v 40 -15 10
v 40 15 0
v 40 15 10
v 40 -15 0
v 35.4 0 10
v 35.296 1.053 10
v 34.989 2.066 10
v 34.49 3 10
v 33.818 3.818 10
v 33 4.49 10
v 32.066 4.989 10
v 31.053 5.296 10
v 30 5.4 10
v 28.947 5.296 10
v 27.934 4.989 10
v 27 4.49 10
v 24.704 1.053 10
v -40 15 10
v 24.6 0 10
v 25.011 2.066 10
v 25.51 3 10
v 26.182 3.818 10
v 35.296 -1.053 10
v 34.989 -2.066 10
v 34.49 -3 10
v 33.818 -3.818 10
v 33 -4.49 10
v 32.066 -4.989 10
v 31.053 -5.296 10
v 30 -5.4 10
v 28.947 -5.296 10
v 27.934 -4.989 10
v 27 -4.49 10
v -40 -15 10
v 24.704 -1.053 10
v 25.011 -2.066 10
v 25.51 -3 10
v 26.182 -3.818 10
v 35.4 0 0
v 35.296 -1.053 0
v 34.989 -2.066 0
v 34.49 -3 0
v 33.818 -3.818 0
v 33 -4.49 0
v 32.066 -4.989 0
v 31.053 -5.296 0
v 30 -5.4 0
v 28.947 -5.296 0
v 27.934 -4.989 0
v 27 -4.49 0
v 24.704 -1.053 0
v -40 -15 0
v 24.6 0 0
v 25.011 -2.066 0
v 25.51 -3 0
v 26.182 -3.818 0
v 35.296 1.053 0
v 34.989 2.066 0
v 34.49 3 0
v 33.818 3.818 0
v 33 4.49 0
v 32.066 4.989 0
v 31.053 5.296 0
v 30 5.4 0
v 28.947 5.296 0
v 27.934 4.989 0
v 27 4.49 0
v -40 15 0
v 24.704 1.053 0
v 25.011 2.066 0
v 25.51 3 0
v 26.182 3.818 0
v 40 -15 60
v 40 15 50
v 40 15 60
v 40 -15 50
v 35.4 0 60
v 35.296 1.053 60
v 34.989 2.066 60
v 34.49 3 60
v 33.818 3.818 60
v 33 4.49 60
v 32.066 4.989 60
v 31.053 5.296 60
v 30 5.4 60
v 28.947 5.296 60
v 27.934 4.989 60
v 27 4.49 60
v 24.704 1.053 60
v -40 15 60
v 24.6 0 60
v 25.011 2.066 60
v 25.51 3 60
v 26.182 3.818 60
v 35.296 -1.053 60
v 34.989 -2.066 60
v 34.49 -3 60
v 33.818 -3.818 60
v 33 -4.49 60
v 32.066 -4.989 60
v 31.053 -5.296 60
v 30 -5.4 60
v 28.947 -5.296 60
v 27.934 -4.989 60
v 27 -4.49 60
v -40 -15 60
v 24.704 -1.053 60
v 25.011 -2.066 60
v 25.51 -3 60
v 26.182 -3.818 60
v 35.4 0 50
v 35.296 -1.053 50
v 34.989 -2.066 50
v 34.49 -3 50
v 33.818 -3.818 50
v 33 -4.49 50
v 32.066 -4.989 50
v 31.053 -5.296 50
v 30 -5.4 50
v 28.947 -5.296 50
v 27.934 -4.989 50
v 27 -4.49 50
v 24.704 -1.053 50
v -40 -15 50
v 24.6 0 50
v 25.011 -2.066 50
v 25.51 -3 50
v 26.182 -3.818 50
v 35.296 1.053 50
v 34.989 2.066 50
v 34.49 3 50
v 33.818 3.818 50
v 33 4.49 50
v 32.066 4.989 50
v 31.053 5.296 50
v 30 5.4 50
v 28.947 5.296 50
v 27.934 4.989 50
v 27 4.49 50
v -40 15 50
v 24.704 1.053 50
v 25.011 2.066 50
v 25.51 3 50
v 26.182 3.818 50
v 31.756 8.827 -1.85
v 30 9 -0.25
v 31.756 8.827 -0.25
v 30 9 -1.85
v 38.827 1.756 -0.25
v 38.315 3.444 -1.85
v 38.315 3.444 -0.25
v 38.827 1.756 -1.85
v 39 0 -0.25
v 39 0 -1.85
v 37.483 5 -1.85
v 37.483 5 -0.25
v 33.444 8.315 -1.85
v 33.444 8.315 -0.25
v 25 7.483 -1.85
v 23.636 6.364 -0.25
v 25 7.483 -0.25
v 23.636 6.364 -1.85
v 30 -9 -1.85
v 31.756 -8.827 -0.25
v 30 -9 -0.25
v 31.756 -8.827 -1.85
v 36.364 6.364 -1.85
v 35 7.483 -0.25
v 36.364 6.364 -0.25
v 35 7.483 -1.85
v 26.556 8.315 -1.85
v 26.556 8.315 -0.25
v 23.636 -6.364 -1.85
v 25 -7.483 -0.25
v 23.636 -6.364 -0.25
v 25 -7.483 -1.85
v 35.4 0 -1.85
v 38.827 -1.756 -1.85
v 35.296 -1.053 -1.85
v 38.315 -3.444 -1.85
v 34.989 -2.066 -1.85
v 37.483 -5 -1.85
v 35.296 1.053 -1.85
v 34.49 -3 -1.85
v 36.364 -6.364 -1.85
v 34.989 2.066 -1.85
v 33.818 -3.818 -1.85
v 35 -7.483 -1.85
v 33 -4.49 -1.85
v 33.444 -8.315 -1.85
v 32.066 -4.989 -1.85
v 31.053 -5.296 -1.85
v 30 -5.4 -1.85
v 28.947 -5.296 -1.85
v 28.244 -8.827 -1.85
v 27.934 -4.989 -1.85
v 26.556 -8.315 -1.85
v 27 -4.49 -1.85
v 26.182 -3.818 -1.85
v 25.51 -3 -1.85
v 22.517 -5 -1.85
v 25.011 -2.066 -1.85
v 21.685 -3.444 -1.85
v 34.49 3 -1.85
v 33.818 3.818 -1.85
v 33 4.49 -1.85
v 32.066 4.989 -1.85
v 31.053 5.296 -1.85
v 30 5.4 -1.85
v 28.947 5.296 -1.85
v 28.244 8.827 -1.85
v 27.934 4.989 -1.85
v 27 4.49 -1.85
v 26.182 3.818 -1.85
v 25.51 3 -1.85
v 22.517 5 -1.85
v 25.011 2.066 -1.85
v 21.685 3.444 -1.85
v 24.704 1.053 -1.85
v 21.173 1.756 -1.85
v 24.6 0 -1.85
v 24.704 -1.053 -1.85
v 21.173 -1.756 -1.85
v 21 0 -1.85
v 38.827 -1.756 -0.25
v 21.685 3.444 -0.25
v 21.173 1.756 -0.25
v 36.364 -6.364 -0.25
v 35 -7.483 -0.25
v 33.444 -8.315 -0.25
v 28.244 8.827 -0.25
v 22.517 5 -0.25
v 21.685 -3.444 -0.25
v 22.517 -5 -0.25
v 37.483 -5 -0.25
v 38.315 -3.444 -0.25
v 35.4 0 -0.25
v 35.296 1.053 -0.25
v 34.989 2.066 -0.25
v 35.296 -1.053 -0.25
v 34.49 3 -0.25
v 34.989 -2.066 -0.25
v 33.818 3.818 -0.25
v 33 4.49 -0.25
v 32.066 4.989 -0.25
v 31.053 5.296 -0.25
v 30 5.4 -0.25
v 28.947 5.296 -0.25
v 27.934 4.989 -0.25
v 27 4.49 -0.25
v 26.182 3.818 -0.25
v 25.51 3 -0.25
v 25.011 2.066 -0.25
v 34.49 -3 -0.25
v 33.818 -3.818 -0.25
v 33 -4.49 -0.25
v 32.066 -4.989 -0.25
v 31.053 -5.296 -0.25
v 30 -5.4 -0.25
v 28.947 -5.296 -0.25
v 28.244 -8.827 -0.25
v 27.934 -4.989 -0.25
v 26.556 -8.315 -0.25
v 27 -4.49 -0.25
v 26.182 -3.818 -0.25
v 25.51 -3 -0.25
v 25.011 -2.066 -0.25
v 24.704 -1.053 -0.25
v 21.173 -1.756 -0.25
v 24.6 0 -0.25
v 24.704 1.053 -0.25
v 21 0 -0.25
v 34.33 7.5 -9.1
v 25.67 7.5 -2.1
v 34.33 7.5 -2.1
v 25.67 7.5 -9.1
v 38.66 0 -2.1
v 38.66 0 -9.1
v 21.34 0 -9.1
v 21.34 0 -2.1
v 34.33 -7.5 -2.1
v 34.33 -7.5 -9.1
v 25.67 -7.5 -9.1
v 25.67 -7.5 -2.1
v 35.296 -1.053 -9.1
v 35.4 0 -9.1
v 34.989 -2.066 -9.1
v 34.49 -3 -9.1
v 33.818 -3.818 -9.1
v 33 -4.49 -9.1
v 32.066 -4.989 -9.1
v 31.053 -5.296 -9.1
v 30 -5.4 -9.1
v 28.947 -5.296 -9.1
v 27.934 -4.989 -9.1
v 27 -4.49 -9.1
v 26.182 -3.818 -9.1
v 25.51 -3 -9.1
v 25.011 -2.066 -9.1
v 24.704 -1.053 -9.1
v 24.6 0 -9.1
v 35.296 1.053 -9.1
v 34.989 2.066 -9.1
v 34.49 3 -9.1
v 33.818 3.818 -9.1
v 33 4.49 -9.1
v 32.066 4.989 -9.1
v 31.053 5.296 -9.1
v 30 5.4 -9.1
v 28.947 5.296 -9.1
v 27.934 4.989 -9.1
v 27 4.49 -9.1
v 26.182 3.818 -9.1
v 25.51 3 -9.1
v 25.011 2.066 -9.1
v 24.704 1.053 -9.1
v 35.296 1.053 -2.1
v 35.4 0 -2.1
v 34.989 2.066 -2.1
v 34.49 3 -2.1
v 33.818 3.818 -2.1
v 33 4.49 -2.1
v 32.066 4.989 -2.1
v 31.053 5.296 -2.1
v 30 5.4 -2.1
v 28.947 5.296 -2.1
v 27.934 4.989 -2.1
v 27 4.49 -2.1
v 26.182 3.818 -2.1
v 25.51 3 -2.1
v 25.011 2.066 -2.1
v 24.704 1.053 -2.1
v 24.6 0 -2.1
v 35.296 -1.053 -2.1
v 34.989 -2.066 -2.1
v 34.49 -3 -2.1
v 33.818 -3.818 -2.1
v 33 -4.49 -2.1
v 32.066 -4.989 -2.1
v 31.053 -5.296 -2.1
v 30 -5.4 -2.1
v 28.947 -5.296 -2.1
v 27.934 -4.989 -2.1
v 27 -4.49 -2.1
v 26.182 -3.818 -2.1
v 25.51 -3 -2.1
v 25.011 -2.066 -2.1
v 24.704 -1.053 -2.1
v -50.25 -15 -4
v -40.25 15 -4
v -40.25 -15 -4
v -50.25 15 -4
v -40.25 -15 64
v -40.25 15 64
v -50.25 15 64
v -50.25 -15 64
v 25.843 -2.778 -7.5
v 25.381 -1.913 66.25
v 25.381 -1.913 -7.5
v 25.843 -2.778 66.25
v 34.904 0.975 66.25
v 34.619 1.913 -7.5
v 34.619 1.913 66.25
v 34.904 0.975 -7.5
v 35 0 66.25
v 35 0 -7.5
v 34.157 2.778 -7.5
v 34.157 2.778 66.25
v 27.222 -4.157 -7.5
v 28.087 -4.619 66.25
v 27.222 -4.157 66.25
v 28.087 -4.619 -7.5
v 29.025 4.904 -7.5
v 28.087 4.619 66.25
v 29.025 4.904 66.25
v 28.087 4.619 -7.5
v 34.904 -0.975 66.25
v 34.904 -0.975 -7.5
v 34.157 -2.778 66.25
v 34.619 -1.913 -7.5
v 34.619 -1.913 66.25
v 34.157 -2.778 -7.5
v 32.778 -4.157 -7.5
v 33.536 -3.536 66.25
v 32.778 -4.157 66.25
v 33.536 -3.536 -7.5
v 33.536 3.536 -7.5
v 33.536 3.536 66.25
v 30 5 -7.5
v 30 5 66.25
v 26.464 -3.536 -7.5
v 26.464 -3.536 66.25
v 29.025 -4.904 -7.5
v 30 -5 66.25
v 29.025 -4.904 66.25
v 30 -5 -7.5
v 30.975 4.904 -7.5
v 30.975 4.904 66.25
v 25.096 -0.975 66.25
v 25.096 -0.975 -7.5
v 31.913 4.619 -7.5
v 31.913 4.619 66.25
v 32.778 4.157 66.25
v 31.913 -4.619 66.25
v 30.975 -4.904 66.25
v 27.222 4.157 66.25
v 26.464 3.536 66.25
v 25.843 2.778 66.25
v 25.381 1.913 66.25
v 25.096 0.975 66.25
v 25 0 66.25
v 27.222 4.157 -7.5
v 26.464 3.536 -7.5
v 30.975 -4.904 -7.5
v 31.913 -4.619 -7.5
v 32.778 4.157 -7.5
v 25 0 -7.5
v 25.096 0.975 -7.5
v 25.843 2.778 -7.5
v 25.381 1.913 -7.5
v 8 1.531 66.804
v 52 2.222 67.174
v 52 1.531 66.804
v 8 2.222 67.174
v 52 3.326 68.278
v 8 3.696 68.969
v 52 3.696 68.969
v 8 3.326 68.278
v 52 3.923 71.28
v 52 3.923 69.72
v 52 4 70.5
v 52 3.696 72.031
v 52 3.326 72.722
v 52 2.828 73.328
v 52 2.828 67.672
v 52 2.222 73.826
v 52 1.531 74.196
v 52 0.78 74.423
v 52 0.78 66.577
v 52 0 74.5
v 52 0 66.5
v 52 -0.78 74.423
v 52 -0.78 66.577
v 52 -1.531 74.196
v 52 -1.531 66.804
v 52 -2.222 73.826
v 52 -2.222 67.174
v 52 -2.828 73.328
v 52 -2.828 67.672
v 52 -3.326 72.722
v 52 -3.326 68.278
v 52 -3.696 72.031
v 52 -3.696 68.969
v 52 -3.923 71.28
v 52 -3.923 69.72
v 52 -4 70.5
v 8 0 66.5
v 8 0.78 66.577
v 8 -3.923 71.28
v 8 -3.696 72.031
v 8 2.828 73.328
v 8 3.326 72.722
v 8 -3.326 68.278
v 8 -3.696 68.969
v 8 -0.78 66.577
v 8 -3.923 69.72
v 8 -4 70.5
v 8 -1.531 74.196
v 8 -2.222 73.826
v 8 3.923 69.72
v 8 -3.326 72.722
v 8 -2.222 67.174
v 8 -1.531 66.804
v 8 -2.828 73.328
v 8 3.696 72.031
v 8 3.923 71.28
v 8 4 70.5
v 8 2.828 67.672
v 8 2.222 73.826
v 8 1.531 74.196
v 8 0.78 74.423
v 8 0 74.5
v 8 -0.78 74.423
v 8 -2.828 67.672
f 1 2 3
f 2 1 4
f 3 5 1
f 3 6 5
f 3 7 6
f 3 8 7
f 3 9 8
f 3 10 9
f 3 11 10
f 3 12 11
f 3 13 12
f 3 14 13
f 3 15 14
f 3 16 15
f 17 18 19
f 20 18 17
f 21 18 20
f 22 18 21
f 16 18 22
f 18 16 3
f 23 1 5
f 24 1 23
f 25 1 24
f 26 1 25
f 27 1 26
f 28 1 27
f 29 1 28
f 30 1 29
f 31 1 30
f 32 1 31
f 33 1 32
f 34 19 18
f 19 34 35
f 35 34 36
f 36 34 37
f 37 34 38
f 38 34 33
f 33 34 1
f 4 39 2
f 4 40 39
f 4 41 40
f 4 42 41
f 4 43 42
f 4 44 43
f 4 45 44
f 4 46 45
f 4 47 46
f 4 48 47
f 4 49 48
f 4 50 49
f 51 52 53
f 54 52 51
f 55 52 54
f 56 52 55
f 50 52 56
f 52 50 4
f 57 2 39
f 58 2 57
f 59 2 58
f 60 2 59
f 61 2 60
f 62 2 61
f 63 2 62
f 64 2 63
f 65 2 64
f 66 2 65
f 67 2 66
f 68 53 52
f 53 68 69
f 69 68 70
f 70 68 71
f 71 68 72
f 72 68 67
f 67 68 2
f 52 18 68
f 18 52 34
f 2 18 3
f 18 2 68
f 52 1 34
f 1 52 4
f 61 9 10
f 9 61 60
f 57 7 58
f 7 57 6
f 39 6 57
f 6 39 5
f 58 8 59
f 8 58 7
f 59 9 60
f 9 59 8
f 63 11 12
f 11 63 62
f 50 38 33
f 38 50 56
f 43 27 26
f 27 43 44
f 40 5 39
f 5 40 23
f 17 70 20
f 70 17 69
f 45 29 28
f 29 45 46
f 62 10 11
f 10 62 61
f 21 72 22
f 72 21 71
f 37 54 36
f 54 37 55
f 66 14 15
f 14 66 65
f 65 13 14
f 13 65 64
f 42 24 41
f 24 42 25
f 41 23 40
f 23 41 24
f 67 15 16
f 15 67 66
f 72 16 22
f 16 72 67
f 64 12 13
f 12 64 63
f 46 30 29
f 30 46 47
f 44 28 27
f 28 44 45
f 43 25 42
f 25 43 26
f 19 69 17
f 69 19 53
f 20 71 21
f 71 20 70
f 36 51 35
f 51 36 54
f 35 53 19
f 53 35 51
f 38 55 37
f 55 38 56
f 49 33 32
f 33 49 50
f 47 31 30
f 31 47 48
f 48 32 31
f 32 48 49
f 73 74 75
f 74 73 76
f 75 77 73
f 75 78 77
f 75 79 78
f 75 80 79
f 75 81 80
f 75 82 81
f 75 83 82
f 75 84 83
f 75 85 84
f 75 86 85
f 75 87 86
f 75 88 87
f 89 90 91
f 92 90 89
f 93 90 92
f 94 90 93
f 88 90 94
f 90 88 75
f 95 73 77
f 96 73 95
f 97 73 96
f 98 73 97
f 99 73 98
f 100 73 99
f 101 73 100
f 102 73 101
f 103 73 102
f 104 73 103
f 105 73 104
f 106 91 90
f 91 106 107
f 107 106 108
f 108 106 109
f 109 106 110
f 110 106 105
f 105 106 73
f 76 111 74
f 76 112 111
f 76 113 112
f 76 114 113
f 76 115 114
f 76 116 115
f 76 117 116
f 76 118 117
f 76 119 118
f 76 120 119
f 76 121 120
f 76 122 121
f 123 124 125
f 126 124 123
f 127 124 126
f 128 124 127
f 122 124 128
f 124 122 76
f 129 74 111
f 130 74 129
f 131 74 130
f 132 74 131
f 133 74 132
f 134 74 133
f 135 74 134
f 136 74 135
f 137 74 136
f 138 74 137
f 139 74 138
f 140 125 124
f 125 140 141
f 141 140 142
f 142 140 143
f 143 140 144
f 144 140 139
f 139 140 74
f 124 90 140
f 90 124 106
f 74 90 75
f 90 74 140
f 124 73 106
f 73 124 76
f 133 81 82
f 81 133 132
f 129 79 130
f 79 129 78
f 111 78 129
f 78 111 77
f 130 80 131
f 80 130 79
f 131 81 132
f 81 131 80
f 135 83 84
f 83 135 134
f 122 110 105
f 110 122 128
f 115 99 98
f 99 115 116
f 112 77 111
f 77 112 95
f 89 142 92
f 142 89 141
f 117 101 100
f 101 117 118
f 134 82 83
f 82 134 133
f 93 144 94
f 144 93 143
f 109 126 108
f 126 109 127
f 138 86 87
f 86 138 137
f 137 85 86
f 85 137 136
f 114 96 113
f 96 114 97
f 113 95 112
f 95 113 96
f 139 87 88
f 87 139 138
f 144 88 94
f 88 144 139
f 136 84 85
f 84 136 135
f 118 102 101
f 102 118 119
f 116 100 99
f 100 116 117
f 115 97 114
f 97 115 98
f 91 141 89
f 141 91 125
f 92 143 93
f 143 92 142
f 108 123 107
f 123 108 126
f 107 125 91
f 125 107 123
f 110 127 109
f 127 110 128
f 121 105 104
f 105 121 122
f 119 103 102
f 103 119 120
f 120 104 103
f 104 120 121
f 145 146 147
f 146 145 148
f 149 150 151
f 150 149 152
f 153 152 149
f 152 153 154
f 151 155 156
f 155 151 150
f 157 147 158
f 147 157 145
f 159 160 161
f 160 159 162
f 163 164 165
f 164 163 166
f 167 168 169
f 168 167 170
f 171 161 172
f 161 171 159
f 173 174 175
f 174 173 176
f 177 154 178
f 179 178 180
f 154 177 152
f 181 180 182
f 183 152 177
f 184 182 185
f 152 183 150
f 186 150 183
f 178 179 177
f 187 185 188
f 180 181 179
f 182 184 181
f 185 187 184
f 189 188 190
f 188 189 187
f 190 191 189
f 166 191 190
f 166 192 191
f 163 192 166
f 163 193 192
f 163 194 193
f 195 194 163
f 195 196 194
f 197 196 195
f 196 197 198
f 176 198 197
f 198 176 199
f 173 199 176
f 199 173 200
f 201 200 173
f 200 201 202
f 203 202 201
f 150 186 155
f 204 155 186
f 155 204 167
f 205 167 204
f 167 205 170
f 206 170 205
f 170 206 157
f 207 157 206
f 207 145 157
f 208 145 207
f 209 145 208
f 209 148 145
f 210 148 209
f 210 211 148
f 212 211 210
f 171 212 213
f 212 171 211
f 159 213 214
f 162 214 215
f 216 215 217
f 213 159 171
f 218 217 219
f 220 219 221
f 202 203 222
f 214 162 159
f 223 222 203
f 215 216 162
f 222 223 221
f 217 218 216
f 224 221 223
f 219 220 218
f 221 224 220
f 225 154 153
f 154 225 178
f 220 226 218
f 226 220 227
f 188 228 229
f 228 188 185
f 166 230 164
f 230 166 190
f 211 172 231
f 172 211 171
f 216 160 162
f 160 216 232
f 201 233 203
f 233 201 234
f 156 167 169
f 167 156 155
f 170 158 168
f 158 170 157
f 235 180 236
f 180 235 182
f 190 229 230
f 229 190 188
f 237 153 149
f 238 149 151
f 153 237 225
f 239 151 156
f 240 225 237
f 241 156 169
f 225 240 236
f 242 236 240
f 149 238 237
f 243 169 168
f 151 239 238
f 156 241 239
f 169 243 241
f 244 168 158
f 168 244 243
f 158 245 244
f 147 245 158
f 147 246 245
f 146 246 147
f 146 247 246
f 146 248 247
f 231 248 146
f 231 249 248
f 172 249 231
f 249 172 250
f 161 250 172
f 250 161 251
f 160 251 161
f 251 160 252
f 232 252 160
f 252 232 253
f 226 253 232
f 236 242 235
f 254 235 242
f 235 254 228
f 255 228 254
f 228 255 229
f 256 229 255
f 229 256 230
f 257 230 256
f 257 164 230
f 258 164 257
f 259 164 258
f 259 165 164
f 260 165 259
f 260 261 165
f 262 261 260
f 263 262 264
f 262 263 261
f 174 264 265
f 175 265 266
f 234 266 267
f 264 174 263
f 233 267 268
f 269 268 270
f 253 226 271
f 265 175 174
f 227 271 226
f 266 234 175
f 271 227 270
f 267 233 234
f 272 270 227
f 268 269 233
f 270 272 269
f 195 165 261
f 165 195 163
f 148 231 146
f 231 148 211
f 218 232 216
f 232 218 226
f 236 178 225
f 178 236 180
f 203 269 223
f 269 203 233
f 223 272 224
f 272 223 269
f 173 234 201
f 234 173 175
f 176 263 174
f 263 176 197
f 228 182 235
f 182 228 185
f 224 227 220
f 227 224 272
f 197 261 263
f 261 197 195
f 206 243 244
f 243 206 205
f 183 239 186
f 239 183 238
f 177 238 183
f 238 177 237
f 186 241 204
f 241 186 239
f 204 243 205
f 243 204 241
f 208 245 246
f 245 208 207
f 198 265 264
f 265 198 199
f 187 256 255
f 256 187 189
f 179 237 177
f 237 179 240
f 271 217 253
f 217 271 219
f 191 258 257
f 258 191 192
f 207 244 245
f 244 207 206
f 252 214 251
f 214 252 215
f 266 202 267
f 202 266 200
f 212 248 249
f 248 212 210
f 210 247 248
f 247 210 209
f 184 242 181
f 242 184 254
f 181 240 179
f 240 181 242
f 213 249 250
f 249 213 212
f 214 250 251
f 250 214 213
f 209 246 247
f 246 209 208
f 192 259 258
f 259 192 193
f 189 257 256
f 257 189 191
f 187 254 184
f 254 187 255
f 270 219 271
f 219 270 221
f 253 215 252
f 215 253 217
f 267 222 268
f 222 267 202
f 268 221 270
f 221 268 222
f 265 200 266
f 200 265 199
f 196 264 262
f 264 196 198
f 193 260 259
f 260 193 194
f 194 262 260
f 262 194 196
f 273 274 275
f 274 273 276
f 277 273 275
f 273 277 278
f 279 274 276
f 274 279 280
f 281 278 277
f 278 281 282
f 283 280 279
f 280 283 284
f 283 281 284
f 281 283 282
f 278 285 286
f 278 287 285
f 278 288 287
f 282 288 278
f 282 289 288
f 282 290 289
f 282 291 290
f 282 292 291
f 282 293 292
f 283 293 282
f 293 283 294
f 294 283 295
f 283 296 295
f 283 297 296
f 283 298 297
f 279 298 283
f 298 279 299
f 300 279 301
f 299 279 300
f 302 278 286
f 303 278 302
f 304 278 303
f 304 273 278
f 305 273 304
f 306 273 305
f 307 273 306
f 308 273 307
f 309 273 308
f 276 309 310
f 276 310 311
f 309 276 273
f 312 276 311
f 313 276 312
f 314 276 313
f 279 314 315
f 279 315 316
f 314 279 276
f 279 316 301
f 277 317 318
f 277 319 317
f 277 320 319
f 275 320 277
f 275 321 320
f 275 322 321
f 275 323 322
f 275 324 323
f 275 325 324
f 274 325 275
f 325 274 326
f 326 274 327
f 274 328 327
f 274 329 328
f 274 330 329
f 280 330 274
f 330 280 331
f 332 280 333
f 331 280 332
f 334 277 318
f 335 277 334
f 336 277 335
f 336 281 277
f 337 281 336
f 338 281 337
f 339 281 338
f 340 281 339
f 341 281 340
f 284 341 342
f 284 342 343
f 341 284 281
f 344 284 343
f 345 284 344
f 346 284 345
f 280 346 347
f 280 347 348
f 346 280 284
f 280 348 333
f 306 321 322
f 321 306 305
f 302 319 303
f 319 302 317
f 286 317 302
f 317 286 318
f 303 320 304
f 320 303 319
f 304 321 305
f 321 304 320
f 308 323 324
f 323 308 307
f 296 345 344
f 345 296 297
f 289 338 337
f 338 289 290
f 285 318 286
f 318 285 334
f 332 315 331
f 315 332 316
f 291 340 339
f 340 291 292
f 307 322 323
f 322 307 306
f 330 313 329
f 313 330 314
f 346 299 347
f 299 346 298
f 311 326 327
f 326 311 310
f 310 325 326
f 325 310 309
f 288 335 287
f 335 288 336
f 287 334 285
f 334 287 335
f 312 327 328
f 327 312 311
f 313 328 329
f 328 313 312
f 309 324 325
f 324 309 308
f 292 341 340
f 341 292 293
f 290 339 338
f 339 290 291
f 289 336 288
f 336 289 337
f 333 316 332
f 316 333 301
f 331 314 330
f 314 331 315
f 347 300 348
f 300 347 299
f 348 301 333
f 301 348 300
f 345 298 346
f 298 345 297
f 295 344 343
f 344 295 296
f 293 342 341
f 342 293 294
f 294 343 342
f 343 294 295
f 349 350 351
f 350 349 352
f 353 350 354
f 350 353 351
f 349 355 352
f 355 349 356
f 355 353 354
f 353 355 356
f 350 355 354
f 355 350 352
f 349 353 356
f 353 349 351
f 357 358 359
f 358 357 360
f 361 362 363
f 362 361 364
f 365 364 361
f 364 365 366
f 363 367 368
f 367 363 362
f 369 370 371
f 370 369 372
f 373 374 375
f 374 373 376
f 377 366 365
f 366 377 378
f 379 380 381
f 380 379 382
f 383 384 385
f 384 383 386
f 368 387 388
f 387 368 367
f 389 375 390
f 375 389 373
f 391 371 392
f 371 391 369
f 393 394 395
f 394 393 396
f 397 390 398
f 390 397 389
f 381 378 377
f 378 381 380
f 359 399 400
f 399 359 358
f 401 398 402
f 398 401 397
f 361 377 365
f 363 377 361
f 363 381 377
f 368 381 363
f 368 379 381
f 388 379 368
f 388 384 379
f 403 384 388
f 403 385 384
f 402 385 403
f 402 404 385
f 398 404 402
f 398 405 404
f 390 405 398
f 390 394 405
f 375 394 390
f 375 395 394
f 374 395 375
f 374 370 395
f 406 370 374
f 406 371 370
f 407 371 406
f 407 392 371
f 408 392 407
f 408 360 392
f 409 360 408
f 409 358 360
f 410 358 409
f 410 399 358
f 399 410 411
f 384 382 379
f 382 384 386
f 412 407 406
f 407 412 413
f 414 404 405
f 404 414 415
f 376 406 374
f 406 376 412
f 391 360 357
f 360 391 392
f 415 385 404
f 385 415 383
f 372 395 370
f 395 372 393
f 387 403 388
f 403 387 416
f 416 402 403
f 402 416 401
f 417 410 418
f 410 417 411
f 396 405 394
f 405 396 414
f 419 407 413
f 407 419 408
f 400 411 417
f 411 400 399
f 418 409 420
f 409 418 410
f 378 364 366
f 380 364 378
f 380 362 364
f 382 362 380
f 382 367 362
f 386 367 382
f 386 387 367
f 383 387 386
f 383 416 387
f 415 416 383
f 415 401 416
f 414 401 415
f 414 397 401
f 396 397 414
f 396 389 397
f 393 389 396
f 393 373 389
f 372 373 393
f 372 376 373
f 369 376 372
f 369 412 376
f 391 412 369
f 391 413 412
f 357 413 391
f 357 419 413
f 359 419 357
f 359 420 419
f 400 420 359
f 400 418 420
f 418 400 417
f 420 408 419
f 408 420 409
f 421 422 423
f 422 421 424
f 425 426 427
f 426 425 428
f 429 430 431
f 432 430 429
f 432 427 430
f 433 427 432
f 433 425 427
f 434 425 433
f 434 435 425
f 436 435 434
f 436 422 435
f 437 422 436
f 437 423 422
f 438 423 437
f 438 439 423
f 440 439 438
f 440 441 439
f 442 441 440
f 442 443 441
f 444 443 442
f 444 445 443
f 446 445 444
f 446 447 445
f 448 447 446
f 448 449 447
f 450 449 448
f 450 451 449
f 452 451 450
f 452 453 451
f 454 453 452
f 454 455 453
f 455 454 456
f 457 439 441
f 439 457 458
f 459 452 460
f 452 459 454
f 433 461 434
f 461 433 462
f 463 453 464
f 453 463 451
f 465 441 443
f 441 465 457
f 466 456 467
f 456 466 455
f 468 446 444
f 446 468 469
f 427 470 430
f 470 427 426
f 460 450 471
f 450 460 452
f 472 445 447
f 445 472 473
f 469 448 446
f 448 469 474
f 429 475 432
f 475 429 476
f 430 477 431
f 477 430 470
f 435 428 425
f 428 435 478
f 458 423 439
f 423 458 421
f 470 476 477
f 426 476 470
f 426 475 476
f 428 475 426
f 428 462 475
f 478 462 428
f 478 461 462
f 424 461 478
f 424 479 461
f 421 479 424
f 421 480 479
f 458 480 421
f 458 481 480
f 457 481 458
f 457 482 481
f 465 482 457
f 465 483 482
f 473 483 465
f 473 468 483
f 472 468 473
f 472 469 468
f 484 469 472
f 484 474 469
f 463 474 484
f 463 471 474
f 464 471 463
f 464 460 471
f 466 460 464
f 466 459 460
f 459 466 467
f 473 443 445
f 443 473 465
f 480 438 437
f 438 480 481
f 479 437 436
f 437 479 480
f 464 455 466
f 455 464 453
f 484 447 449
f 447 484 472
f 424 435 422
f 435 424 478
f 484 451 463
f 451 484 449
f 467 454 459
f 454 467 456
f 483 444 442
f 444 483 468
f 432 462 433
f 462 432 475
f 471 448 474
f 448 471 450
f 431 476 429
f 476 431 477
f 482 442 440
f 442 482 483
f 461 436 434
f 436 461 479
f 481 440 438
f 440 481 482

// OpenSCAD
$fn = 32;

// ------------------------------------------------------------------------
// C clamp: throat 50 mm, screw d10
// Every part is its own module, assembly() places every instance.
// ------------------------------------------------------------------------

// --- part 1 ---
module clamp_arm() {
  difference() {
    translate([-40, -15, 0]) cube([80, 30, 10]);
    translate([30, 0, -1]) cylinder(h = 12, d = 10.8);
  }
}

// --- part 2 ---
module clamp_spine() {
  difference() {
    translate([-34, -15, 0]) cube([68, 30, 10]);
  }
}

// --- part 3 ---
module clamp_screw() {
  translate([0, 0, -36.875]) cylinder(h = 73.75, d = 10);
}

// --- part 4 ---
module clamp_washer() {
  difference() {
      translate([0, 0, 0]) cylinder(h = 1.6, d = 18);
      translate([0, 0, -1]) cylinder(h = 3.6, d = 10.8);
    }
}

// --- part 5 ---
module clamp_nut() {
  difference() {
    linear_extrude(height = 7) polygon(points = [[8.66, 0], [4.33, 7.5], [-4.33, 7.5], [-8.66, 0], [-4.33, -7.5], [4.33, -7.5]]);
    translate([0, 0, -1]) cylinder(h = 9, d = 10.8);
  }
}

// --- part 6 ---
module tommy_bar() {
  translate([0, 0, -22]) cylinder(h = 44, d = 8);
}

// --- assembly ---
module assembly() {
  color([0.80, 0.24, 0.20]) translate([0, 0, 0]) rotate([0, 0, 0]) clamp_arm();
  color([0.20, 0.45, 0.75]) translate([0, 0, 50]) rotate([0, 0, 0]) clamp_arm();
  color([0.25, 0.62, 0.32]) translate([-50.25, 0, 30]) rotate([0, 90, 0]) clamp_spine();
  color([0.92, 0.70, 0.18]) translate([30, 0, 29.375]) rotate([0, 0, 0]) clamp_screw();
  color([0.58, 0.35, 0.70]) translate([30, 0, -1.85]) rotate([0, 0, 0]) clamp_washer();
  color([0.16, 0.66, 0.66]) translate([30, 0, -9.1]) rotate([0, 0, 0]) clamp_nut();
  color([0.85, 0.48, 0.18]) translate([30, 0, 70.5]) rotate([0, 90, 0]) tommy_bar();
}

assembly();
